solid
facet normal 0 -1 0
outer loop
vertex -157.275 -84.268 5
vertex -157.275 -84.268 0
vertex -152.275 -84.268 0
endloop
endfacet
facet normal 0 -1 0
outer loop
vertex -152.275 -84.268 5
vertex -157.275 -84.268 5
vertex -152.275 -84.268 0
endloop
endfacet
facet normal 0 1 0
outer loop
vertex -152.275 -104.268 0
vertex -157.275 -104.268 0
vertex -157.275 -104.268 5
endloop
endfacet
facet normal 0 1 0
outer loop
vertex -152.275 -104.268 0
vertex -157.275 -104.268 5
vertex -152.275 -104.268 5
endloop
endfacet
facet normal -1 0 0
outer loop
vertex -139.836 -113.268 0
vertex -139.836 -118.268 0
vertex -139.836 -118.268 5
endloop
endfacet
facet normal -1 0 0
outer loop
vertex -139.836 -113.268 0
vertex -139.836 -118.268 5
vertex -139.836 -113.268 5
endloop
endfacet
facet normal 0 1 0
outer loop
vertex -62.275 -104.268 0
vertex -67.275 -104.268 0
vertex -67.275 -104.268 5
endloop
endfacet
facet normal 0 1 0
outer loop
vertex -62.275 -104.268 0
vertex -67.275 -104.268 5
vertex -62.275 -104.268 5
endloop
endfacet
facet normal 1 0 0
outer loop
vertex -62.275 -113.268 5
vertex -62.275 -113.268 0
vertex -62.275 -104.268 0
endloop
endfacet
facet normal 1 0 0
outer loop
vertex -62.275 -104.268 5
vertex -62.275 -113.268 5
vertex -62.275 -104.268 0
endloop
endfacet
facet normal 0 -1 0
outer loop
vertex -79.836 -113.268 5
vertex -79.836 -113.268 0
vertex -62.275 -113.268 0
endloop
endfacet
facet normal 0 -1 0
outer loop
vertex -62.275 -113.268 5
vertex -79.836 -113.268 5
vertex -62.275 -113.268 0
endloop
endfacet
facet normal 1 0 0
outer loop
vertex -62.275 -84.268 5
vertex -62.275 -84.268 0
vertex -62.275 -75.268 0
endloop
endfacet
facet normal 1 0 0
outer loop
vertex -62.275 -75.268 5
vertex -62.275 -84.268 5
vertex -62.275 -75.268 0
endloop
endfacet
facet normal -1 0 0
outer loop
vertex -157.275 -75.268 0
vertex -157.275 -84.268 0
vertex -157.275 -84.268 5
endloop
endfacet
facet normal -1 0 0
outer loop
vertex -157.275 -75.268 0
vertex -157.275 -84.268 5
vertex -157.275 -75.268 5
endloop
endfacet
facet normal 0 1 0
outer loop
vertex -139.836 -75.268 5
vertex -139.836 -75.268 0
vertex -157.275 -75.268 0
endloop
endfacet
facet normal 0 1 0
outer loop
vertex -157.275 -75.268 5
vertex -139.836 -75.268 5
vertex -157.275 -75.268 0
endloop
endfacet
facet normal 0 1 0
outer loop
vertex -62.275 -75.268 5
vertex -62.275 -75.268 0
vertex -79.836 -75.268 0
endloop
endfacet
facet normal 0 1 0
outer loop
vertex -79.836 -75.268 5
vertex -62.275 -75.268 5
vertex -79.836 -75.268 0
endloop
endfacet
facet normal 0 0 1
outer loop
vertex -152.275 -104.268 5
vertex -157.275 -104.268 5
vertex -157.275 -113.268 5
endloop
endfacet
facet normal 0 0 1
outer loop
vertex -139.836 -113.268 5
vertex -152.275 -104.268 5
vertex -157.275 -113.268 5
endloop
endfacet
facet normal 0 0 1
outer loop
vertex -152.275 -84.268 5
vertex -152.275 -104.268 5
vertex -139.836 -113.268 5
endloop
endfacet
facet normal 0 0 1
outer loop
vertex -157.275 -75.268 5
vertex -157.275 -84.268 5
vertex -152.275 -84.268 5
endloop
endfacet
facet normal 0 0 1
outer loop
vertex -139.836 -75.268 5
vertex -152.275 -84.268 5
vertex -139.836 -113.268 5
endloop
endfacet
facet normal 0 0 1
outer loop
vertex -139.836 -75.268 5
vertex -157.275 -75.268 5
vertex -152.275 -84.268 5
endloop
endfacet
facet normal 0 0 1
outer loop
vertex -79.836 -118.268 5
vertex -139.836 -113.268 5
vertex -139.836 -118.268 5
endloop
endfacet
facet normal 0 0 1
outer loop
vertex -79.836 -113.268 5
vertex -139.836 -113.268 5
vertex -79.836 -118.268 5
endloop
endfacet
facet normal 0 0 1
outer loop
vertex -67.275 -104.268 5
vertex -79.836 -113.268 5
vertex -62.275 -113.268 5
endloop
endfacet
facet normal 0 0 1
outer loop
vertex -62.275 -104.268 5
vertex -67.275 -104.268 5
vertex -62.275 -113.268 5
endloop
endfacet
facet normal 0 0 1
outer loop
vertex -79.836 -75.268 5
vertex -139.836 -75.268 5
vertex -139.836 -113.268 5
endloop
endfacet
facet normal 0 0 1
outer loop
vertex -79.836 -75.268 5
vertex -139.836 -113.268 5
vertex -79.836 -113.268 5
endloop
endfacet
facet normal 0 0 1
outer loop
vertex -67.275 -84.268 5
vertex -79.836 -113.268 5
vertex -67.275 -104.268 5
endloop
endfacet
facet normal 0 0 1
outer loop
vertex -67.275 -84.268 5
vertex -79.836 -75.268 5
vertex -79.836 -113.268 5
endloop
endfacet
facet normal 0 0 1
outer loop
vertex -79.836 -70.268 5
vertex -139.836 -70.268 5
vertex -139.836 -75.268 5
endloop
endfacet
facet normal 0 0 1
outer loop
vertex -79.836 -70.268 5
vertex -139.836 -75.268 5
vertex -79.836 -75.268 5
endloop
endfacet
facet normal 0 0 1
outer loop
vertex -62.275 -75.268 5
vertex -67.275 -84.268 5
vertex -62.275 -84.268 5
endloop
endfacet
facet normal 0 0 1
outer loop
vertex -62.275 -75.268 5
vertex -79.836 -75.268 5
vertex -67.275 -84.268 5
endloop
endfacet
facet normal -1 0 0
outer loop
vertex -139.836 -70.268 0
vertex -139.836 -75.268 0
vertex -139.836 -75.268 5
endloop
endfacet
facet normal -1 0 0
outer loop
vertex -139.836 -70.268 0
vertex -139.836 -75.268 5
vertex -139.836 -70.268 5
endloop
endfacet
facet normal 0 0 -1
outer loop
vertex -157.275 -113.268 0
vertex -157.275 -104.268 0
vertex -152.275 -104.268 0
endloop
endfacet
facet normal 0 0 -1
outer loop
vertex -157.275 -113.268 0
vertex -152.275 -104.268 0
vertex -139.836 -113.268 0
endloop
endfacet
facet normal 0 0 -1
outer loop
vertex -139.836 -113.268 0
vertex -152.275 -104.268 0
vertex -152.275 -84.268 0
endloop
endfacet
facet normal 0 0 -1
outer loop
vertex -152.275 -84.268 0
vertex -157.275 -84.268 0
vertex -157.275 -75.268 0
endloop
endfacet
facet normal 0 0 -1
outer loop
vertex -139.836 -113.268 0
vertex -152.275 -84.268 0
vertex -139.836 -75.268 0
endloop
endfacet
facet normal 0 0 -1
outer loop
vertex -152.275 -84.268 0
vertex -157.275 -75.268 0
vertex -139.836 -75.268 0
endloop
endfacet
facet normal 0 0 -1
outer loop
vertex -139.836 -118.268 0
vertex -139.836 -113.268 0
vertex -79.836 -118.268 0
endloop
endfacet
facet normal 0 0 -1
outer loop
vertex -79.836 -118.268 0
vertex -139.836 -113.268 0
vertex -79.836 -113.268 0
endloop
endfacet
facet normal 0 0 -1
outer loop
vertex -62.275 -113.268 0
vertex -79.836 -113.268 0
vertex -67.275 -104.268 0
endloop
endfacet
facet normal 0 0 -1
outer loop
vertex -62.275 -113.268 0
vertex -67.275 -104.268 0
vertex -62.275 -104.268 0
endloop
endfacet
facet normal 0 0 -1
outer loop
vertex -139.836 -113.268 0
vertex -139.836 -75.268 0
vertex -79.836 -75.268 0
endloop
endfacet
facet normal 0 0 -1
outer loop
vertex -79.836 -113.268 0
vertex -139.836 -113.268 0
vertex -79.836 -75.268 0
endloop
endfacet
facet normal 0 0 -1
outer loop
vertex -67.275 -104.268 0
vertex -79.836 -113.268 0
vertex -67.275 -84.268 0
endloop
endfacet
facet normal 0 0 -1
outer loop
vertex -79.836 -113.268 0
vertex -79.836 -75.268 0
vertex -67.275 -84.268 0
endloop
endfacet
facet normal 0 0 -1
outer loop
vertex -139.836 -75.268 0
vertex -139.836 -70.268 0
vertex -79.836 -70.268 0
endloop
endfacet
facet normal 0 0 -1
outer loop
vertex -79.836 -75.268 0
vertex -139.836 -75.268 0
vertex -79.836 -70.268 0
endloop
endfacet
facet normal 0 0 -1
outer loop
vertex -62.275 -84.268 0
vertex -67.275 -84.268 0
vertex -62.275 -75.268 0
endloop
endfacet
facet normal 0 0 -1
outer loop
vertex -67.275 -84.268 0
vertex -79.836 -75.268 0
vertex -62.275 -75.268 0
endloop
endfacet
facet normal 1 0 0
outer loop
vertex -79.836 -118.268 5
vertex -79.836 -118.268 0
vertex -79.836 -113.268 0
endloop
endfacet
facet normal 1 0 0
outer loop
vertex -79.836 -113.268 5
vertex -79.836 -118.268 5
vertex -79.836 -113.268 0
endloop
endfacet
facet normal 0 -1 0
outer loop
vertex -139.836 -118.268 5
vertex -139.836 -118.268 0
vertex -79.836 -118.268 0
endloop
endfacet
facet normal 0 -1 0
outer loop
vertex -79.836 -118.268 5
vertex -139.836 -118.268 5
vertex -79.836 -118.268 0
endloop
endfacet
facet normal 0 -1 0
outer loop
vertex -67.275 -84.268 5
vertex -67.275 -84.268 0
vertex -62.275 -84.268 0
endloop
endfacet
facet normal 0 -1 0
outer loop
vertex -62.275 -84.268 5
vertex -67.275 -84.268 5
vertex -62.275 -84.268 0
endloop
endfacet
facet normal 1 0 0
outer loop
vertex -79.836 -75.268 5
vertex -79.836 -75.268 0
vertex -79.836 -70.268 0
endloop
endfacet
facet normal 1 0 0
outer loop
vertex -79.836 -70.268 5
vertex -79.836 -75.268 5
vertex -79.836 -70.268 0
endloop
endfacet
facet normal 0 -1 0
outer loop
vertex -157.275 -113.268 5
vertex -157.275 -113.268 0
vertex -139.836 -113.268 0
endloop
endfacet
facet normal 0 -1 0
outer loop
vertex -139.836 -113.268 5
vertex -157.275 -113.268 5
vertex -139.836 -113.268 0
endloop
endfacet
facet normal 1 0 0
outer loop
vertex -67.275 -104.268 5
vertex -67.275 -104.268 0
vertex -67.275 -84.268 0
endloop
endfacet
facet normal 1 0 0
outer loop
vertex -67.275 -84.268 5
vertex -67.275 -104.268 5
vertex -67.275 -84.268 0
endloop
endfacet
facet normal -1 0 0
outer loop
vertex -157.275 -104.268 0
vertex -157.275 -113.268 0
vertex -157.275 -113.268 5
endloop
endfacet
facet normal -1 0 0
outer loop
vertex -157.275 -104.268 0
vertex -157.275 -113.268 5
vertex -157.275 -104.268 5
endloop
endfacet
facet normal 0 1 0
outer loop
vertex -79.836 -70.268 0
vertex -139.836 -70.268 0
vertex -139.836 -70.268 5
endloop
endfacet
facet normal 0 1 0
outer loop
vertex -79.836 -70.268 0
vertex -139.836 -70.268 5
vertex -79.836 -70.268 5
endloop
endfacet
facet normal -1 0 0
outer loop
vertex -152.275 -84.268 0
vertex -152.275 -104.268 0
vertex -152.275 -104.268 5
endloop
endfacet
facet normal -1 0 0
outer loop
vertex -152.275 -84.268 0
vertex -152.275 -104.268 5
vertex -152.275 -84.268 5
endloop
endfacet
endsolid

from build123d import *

# Parameters (mm, degrees)
AUFSATZ_LINEAR_AUSTRAGEN1_DEPTH = 5


with BuildPart() as part:
    # Skizze1 → Aufsatz-Linear austragen1 (new body)
    with BuildSketch(Plane.XY):
        Polygon((-79.835742472, -70.268113146), (-139.835742472, -70.268113146), (-139.835742472, -75.268113146), (-157.274617185, -75.268113146), (-157.274617185, -84.268113146), (-152.274617185, -84.268113146), (-152.274617185, -104.268113146), (-157.274617185, -104.268113146), (-157.274617185, -113.268113146), (-139.835742472, -113.268113146), (-139.835742472, -118.268113146), (-79.835742472, -118.268113146), (-79.835742472, -113.268113146), (-62.274617185, -113.268113146), (-62.274617185, -104.268113146), (-67.274617185, -104.268113146), (-67.274617185, -84.268113146), (-62.274617185, -84.268113146), (-62.274617185, -75.268113146), (-79.835742472, -75.268113146), align=None)
    extrude(amount=AUFSATZ_LINEAR_AUSTRAGEN1_DEPTH)


solid = part.part
